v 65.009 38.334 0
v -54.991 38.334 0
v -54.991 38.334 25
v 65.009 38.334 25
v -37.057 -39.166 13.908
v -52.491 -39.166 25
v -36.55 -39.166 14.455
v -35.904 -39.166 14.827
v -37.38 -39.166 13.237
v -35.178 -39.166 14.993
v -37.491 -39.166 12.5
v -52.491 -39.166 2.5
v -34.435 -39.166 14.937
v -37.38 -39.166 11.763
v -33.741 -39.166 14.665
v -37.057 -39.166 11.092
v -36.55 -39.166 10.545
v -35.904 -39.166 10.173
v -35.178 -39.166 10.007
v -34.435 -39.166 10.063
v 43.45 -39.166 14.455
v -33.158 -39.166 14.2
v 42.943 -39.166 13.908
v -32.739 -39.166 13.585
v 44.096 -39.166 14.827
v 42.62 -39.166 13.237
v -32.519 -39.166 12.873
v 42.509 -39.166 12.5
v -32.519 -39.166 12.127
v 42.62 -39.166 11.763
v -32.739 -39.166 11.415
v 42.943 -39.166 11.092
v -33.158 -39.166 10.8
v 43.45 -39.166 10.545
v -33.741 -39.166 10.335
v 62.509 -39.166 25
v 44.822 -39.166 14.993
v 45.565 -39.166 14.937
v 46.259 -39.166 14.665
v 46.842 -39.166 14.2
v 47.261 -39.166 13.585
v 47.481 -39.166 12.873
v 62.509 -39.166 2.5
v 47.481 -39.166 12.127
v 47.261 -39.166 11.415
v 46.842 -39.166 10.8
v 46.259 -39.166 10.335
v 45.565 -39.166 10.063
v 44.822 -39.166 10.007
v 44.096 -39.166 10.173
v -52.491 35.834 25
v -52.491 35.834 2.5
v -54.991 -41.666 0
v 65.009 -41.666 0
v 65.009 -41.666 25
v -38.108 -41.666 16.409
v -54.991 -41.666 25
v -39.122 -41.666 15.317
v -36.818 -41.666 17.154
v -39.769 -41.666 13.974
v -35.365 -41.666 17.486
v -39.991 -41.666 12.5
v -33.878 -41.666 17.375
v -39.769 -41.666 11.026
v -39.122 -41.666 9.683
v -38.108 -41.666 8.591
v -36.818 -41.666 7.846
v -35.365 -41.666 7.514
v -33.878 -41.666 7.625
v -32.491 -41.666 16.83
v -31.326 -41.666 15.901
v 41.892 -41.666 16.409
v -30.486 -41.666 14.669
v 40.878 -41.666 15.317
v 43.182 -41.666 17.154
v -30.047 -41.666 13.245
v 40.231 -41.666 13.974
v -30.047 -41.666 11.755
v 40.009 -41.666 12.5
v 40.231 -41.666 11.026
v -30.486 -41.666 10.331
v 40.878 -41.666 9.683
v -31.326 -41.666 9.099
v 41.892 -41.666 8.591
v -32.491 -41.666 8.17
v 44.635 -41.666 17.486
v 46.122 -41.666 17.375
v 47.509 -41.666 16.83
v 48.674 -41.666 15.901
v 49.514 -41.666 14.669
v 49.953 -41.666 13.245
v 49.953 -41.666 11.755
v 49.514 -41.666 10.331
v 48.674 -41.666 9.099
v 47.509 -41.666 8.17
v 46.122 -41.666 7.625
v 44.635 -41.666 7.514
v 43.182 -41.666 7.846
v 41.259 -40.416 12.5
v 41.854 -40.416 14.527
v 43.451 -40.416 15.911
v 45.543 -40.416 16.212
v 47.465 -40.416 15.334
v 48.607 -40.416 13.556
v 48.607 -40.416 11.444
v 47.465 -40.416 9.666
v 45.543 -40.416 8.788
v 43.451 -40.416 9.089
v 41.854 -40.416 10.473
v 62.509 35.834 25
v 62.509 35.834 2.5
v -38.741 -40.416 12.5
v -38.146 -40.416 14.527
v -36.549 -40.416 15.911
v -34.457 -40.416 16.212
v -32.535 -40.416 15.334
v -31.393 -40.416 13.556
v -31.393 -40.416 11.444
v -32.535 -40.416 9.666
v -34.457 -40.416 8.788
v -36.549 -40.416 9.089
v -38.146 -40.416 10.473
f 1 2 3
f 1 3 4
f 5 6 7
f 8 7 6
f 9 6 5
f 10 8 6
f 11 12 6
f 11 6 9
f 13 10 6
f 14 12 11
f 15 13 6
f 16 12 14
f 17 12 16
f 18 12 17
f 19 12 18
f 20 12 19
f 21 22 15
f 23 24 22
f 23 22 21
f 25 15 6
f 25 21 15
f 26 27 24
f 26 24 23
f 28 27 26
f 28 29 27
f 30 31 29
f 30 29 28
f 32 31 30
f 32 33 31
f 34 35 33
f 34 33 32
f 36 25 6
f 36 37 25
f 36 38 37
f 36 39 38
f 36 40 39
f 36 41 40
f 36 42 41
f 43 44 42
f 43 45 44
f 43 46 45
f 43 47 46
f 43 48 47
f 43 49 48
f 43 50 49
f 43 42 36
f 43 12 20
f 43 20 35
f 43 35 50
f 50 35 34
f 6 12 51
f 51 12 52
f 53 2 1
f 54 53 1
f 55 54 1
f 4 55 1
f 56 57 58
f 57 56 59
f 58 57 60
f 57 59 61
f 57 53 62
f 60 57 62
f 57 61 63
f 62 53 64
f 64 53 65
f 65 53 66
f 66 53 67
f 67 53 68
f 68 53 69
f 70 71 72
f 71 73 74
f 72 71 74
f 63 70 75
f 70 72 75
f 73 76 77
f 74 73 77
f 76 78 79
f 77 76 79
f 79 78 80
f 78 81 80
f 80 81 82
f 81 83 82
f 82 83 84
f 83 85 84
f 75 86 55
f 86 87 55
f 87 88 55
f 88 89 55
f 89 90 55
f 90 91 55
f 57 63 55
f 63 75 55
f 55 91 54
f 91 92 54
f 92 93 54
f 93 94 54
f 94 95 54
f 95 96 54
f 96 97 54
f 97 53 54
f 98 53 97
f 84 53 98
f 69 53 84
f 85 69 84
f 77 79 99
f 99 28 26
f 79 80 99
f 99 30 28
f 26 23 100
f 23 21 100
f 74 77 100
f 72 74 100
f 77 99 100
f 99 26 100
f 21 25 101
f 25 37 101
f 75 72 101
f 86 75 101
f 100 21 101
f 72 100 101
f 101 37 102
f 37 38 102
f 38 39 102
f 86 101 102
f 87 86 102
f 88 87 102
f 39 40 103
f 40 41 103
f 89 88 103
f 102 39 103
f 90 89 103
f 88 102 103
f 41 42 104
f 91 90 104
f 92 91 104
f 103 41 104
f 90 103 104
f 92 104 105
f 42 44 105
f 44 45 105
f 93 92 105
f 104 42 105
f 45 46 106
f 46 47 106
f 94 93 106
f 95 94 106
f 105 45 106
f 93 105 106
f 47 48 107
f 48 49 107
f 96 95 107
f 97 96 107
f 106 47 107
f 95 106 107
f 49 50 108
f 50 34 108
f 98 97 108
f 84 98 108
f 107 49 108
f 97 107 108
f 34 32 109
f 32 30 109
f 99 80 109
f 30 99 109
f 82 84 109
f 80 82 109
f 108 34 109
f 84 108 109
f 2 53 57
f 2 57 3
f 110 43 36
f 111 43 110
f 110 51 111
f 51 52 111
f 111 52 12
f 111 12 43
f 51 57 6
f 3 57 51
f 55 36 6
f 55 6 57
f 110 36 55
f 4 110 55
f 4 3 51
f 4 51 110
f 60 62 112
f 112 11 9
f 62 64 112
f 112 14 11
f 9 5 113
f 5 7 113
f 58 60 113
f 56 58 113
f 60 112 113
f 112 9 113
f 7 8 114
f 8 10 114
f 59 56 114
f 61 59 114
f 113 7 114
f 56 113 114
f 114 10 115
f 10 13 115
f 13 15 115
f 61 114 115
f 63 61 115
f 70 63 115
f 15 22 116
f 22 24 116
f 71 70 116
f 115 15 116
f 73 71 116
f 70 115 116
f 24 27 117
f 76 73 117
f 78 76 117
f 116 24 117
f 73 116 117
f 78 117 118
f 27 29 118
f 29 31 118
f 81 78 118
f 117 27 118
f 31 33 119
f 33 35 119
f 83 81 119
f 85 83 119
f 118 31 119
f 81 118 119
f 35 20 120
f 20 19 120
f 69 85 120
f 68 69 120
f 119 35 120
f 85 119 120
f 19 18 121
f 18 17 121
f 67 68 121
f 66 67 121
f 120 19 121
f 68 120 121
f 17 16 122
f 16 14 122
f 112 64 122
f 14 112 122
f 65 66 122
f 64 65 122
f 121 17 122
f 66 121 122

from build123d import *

# Parameters (mm, degrees)
F0_W           = 120
F0_H           = 80
F1_DEPTH       = 25
F2_T           = -2.5
F4_D           = 5
F4_DEPTH       = 12
F4_CSINK_D     = 10
F4_CSINK_ANGLE = 90
F5_D           = 5
F5_DEPTH       = 12
F5_CSINK_D     = 10
F5_CSINK_ANGLE = 90


with BuildPart() as f1:
    # F0 (on Top) → F1 (new body)
    with BuildSketch(Plane.XY):
        with Locations((5.008996, -1.665502)):
            Rectangle(F0_W, F0_H)
    extrude(amount=F1_DEPTH)

    # F2
    f2_openings = [f1.faces().sort_by_distance(p)[0] for p in [
        (5.008996, -1.665502, 25),
    ]]
    offset(amount=F2_T, openings=f2_openings)

    # F4
    with Locations(Plane.XZ.offset(41.665502)):
        with Locations((-34.991004, 12.5)):
            CounterSinkHole(F4_D / 2, F4_CSINK_D / 2, depth=F4_DEPTH, counter_sink_angle=F4_CSINK_ANGLE)

    # F5
    with Locations(Plane.XZ.offset(41.665502)):
        with Locations((45.008996, 12.5)):
            CounterSinkHole(F5_D / 2, F5_CSINK_D / 2, depth=F5_DEPTH, counter_sink_angle=F5_CSINK_ANGLE)


solid = f1.part
